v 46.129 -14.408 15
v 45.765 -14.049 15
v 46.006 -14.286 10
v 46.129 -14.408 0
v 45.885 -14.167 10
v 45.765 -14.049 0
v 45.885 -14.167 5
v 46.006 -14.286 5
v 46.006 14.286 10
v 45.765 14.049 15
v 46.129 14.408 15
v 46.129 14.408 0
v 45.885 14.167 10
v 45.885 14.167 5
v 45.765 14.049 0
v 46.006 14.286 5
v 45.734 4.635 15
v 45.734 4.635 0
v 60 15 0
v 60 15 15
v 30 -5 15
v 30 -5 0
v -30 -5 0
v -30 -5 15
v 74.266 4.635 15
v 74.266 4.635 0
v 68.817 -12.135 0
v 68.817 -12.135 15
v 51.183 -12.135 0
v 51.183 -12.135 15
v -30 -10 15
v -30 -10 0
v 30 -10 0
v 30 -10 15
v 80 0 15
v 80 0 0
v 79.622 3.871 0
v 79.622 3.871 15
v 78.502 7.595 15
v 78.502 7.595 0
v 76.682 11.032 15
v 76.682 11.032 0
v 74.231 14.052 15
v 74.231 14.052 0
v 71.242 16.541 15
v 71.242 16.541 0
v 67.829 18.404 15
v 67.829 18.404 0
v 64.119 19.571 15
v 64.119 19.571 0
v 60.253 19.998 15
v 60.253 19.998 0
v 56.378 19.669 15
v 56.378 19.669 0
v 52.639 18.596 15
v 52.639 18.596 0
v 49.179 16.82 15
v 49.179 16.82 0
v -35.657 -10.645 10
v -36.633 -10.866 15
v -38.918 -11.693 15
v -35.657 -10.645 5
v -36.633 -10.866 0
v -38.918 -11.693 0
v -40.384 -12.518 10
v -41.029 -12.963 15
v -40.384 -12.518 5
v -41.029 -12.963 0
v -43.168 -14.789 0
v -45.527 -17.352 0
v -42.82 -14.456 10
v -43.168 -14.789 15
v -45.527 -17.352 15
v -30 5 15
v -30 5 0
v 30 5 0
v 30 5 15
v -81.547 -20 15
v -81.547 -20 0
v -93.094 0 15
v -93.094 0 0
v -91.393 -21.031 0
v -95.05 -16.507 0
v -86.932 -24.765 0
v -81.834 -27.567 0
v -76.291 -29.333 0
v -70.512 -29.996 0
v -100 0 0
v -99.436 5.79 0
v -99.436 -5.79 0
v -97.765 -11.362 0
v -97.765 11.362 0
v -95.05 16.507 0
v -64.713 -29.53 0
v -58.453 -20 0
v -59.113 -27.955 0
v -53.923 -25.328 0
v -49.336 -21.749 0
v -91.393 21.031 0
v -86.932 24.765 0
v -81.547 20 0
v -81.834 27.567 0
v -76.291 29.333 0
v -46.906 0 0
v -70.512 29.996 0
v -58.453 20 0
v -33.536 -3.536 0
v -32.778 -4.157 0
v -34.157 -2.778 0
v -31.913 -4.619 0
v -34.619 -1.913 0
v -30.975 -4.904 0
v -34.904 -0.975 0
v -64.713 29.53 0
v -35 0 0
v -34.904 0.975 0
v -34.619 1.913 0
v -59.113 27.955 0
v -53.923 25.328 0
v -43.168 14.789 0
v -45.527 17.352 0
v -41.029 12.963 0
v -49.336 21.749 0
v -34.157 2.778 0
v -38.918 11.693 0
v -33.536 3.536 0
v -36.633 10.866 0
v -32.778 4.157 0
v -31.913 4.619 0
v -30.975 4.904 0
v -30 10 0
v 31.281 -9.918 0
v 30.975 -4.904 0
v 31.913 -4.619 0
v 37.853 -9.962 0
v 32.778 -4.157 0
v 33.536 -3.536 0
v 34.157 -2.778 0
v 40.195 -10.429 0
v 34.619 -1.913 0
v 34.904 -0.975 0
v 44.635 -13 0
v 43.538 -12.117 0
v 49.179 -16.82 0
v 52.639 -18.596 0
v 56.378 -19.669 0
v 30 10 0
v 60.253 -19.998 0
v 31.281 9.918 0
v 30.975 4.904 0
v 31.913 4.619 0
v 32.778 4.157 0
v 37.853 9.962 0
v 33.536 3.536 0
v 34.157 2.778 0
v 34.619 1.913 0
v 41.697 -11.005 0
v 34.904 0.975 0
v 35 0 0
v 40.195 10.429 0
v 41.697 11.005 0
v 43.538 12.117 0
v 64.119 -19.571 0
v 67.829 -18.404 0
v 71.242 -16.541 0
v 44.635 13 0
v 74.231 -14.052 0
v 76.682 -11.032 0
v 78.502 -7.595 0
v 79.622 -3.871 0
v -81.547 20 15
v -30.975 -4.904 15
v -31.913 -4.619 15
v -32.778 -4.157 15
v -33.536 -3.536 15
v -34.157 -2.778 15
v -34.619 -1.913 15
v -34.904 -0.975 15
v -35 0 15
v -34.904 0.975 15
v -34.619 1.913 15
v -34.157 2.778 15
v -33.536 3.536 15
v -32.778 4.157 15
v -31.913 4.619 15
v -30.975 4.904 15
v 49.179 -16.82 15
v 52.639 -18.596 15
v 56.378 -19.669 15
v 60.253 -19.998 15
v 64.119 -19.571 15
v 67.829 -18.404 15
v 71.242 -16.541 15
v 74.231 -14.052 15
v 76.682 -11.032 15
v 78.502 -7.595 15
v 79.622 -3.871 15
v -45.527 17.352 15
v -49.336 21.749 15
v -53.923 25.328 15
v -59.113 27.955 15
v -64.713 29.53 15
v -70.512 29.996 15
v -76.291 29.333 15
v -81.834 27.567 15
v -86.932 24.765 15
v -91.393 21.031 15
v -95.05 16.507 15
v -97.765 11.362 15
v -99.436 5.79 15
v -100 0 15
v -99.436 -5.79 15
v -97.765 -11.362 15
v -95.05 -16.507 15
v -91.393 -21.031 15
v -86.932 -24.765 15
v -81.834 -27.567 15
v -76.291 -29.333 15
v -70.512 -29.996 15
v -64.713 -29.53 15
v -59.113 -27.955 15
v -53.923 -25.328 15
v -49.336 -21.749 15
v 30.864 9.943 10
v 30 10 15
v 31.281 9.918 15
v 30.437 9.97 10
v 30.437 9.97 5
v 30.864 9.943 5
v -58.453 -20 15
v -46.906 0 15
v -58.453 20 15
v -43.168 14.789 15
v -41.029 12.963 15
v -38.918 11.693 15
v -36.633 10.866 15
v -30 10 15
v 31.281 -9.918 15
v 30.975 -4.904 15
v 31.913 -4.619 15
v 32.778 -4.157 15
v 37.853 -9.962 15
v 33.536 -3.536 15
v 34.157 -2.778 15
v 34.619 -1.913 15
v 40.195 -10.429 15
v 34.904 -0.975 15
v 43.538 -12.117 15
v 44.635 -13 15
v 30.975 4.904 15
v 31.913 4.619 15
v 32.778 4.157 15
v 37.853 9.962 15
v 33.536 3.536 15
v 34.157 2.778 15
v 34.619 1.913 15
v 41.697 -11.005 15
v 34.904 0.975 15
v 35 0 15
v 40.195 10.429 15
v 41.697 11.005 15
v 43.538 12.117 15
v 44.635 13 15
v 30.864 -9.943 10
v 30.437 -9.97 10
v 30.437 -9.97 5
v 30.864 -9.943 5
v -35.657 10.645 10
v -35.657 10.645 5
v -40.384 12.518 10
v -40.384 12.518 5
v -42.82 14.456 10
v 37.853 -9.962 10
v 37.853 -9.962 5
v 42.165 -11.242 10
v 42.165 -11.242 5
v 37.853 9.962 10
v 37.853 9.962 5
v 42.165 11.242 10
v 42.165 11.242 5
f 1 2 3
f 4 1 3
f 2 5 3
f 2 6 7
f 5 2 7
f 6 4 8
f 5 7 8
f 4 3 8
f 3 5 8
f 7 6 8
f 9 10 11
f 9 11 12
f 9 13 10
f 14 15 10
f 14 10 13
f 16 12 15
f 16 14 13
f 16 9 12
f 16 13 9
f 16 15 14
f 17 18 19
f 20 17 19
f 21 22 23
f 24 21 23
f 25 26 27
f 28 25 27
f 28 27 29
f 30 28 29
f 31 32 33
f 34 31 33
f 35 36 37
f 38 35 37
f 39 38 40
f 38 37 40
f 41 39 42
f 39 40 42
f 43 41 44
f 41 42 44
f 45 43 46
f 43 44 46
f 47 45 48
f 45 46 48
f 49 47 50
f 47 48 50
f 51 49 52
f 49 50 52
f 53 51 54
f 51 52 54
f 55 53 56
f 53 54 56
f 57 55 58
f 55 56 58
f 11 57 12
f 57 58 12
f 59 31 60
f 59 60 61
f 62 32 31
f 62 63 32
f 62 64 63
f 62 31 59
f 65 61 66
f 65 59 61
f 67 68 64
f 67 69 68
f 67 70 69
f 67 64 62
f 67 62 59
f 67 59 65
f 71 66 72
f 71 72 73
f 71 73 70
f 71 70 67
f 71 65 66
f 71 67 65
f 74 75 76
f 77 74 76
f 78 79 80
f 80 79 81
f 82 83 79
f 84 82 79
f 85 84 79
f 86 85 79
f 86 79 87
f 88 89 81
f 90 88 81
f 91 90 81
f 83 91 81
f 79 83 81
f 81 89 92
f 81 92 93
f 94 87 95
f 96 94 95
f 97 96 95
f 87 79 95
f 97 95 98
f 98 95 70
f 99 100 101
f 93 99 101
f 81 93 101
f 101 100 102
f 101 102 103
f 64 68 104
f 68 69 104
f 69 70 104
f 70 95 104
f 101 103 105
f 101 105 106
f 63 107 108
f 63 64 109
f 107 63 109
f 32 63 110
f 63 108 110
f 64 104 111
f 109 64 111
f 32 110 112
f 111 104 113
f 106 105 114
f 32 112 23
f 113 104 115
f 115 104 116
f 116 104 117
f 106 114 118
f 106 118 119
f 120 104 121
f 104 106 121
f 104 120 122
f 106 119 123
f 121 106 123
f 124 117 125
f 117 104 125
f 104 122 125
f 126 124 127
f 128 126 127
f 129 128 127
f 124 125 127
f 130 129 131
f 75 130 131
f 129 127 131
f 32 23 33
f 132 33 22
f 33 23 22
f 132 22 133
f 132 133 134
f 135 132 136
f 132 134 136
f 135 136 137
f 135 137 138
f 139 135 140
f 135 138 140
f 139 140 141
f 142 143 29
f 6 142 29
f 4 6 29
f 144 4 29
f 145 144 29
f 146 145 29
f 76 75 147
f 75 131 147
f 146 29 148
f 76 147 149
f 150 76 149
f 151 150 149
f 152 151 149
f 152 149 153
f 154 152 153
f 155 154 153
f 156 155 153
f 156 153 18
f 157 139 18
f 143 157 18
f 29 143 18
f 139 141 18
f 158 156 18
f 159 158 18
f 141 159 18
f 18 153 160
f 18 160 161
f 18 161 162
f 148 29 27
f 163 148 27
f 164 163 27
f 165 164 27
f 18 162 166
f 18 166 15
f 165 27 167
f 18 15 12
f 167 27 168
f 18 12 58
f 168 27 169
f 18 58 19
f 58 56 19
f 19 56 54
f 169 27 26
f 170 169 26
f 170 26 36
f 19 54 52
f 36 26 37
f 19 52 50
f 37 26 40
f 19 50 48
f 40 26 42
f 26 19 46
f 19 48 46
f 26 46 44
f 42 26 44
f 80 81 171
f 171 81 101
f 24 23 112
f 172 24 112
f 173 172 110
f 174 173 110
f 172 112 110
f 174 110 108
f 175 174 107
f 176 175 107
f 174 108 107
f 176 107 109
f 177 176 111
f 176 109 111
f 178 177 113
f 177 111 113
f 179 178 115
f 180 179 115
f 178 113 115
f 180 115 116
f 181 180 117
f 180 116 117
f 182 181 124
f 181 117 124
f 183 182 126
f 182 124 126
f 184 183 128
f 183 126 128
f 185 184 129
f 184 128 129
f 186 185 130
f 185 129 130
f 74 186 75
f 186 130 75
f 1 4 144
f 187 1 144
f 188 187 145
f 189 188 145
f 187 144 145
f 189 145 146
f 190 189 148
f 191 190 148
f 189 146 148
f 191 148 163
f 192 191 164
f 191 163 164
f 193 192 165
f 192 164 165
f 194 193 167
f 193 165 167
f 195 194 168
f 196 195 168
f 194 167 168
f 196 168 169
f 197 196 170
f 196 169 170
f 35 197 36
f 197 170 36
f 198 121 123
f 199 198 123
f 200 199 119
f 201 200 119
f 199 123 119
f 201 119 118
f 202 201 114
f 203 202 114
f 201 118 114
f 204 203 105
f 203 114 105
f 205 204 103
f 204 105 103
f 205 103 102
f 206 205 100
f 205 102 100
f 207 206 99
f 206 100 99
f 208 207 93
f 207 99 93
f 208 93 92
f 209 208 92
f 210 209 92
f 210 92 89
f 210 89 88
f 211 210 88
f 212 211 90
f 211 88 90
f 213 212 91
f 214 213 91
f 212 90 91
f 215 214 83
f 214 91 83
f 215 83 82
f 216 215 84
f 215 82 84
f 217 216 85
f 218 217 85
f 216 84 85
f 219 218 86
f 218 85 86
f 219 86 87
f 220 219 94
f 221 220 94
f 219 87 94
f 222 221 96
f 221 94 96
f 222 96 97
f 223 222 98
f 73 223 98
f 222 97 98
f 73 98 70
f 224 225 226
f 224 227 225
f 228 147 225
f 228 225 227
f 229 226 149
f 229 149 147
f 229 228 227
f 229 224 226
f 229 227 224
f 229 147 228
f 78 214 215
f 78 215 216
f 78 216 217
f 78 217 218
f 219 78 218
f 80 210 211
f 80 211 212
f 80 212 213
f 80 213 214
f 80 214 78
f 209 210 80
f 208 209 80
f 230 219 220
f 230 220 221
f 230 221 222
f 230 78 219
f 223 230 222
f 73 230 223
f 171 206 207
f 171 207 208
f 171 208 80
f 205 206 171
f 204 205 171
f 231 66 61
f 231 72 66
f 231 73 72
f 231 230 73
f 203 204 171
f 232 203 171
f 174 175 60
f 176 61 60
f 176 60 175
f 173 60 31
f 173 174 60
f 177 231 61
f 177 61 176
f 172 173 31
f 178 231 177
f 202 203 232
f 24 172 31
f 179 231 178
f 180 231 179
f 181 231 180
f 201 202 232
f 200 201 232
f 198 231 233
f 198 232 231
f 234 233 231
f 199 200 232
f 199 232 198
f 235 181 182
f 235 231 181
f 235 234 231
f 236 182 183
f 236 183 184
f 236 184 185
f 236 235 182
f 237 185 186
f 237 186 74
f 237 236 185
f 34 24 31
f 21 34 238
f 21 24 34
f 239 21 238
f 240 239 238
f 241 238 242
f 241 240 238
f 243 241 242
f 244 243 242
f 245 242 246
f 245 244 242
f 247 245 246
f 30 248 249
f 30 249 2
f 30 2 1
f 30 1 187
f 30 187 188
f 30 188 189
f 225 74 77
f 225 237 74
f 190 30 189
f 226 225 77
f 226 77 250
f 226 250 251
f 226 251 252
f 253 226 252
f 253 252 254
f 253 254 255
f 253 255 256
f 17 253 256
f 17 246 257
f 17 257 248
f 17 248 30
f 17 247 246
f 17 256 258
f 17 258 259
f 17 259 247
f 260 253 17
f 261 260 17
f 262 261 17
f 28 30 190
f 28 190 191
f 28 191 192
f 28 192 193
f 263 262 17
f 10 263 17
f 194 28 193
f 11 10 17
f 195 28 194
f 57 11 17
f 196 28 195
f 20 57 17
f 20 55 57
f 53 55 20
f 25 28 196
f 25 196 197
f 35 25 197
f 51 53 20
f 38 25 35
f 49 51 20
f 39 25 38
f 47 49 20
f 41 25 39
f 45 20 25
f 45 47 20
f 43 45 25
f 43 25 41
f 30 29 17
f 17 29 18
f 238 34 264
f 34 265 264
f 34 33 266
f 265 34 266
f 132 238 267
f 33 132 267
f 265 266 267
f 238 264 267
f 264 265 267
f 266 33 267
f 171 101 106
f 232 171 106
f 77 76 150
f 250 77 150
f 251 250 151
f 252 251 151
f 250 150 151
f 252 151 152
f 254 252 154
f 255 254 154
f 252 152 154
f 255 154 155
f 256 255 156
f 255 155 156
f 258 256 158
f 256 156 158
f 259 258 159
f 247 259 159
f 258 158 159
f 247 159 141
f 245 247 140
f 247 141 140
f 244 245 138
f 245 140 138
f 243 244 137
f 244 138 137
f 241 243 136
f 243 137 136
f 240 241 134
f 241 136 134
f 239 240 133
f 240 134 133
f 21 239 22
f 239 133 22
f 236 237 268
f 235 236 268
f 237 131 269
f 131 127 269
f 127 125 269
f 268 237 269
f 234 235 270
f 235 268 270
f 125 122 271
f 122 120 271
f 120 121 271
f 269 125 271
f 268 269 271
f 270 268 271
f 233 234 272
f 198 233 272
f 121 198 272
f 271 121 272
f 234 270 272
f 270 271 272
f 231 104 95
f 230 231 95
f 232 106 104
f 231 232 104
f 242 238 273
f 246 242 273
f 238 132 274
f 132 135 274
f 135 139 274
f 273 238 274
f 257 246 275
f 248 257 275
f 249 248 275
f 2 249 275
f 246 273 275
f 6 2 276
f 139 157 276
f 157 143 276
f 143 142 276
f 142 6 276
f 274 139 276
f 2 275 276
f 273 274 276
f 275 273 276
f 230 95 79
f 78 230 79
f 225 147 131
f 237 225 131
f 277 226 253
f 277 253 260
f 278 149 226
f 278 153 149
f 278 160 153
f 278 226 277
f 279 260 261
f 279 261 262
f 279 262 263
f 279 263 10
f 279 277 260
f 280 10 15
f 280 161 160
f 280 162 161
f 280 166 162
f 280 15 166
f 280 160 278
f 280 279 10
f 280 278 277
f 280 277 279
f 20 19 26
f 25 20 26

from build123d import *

# Parameters (mm, degrees)
F1_DEPTH = 15


with BuildPart() as f1:
    # F0 (on Top) → F1 (new body)
    with BuildSketch(Plane.XY):
        with BuildLine():
            Line((30, 10), (-30, 10))
            ThreePointArc((-30, 10), (-37.0710678119, 7.0710678119), (-40, 0))
            ThreePointArc((-40, 0), (-37.0710678119, -7.0710678119), (-30, -10))
            Line((-30, -10), (30, -10))
            add(Edge.make_bspline(
                [(30, -10), (30.4419813549, -9.9690694458), (30.8687106597, -9.941549094), (31.2810670558, -9.9176039041)],
                knots=[0, 0, 0, 0, 0.775534817, 0.775534817, 0.775534817, 0.775534817], degree=3))
            ThreePointArc((31.2810670558, -9.9176039041), (37.51034856, -6.6026255768), (40, 4.32e-08))
            ThreePointArc((40, 4.32e-08), (37.5103485315, 6.6026256092), (31.2810670558, 9.9176039041))
            add(Edge.make_bspline(
                [(30, 10), (30.4419813549, 9.9690694458), (30.8687106597, 9.941549094), (31.2810670558, 9.9176039041)],
                knots=[0, 0, 0, 0, 0.775534817, 0.775534817, 0.775534817, 0.775534817], degree=3))
        make_face()
        with BuildLine():
            Line((30, -5), (-30, -5))
            ThreePointArc((-30, -5), (-35, 0), (-30, 5))
            Line((-30, 5), (30, 5))
            ThreePointArc((30, 5), (35, 0), (30, -5))
        make_face(mode=Mode.SUBTRACT)
        with BuildLine():
            ThreePointArc((-40, 0), (-37.0710678119, 7.0710678119), (-30, 10))
            add(Edge.make_bspline(
                [(-30, 10), (-36.5690253675, 10.6094982475), (-39.7284552455, 10.459353216), (-45.5274550985, 17.3520761307)],
                knots=[0, 0, 0, 0, 17.1800723301, 17.1800723301, 17.1800723301, 17.1800723301], degree=3))
            ThreePointArc((-45.5274550985, 17.3520761307), (-41.4152457852, 9.1055931426), (-40, 0))
        make_face()
        with BuildLine():
            ThreePointArc((-45.5274550985, -17.3520761307), (-41.4152457852, -9.1055931426), (-40, 0))
            ThreePointArc((-40, 0), (-41.4152457852, 9.1055931426), (-45.5274550985, 17.3520761307))
            ThreePointArc((-45.5274550985, 17.3520761307), (-100, 0), (-45.5274550985, -17.3520761307))
        make_face()
        Polygon((-93.0940107676, 0), (-81.5470053838, 20), (-58.4529946162, 20), (-46.9059892324, 0), (-58.4529946162, -20), (-81.5470053838, -20), align=None, mode=Mode.SUBTRACT)
        with BuildLine():
            ThreePointArc((-30, -10), (-37.0710678119, -7.0710678119), (-40, 0))
            ThreePointArc((-40, 0), (-41.4152457852, -9.1055931426), (-45.5274550985, -17.3520761307))
            add(Edge.make_bspline(
                [(-30, -10), (-36.5690253675, -10.6094982475), (-39.7284552455, -10.459353216), (-45.5274550985, -17.3520761307)],
                knots=[0, 0, 0, 0, 17.1800723301, 17.1800723301, 17.1800723301, 17.1800723301], degree=3))
        make_face()
        with BuildLine():
            add(Edge.make_bspline(
                [(31.2810670558, 9.9176039041), (39.496869131, 9.4405191711), (42.0070999801, 10.3826559201), (45.765051322, 14.0487094117)],
                knots=[0.775534817, 0.775534817, 0.775534817, 0.775534817, 16.2273154098, 16.2273154098, 16.2273154098, 16.2273154098], degree=3))
            ThreePointArc((31.2810670558, 9.9176039041), (37.5103485315, 6.6026256092), (40, 4.32e-08))
            ThreePointArc((40, 4.32e-08), (41.4973113717, 7.5927935257), (45.765051322, 14.0487094117))
        make_face()
        with BuildLine():
            ThreePointArc((45.765051322, -14.0487094117), (41.4973113553, -7.5927934857), (40, 4.32e-08))
            ThreePointArc((40, 4.32e-08), (37.51034856, -6.6026255768), (31.2810670558, -9.9176039041))
            add(Edge.make_bspline(
                [(31.2810670558, -9.9176039041), (39.496869131, -9.4405191711), (42.0070999801, -10.3826559201), (45.765051322, -14.0487094117)],
                knots=[0.775534817, 0.775534817, 0.775534817, 0.775534817, 16.2273154098, 16.2273154098, 16.2273154098, 16.2273154098], degree=3))
        make_face()
        with BuildLine():
            ThreePointArc((45.765051322, 14.0487094117), (41.4973113717, 7.5927935257), (40, 4.32e-08))
            ThreePointArc((40, 4.32e-08), (41.4973113553, -7.5927934857), (45.765051322, -14.0487094117))
            add(Edge.make_bspline(
                [(45.765051322, -14.0487094117), (45.8848721077, -14.1656000709), (46.0059613608, -14.2852599399), (46.1285444707, -14.4077313099)],
                knots=[16.2273154098, 16.2273154098, 16.2273154098, 16.2273154098, 16.7199892956, 16.7199892956, 16.7199892956, 16.7199892956], degree=3))
            ThreePointArc((46.1285444707, -14.4077313099), (67.828502073, -18.4041993929), (80, 0))
            ThreePointArc((80, 0), (67.828502073, 18.4041993929), (46.1285444707, 14.4077313099))
            add(Edge.make_bspline(
                [(45.765051322, 14.0487094117), (45.8848721077, 14.1656000709), (46.0059613608, 14.2852599399), (46.1285444707, 14.4077313099)],
                knots=[16.2273154098, 16.2273154098, 16.2273154098, 16.2273154098, 16.7199892956, 16.7199892956, 16.7199892956, 16.7199892956], degree=3))
        make_face()
        Polygon((45.7341522556, 4.6352549156), (60, 15), (74.2658477444, 4.6352549156), (68.8167787844, -12.1352549156), (51.1832212156, -12.1352549156), align=None, mode=Mode.SUBTRACT)
    extrude(amount=F1_DEPTH)


solid = f1.part
